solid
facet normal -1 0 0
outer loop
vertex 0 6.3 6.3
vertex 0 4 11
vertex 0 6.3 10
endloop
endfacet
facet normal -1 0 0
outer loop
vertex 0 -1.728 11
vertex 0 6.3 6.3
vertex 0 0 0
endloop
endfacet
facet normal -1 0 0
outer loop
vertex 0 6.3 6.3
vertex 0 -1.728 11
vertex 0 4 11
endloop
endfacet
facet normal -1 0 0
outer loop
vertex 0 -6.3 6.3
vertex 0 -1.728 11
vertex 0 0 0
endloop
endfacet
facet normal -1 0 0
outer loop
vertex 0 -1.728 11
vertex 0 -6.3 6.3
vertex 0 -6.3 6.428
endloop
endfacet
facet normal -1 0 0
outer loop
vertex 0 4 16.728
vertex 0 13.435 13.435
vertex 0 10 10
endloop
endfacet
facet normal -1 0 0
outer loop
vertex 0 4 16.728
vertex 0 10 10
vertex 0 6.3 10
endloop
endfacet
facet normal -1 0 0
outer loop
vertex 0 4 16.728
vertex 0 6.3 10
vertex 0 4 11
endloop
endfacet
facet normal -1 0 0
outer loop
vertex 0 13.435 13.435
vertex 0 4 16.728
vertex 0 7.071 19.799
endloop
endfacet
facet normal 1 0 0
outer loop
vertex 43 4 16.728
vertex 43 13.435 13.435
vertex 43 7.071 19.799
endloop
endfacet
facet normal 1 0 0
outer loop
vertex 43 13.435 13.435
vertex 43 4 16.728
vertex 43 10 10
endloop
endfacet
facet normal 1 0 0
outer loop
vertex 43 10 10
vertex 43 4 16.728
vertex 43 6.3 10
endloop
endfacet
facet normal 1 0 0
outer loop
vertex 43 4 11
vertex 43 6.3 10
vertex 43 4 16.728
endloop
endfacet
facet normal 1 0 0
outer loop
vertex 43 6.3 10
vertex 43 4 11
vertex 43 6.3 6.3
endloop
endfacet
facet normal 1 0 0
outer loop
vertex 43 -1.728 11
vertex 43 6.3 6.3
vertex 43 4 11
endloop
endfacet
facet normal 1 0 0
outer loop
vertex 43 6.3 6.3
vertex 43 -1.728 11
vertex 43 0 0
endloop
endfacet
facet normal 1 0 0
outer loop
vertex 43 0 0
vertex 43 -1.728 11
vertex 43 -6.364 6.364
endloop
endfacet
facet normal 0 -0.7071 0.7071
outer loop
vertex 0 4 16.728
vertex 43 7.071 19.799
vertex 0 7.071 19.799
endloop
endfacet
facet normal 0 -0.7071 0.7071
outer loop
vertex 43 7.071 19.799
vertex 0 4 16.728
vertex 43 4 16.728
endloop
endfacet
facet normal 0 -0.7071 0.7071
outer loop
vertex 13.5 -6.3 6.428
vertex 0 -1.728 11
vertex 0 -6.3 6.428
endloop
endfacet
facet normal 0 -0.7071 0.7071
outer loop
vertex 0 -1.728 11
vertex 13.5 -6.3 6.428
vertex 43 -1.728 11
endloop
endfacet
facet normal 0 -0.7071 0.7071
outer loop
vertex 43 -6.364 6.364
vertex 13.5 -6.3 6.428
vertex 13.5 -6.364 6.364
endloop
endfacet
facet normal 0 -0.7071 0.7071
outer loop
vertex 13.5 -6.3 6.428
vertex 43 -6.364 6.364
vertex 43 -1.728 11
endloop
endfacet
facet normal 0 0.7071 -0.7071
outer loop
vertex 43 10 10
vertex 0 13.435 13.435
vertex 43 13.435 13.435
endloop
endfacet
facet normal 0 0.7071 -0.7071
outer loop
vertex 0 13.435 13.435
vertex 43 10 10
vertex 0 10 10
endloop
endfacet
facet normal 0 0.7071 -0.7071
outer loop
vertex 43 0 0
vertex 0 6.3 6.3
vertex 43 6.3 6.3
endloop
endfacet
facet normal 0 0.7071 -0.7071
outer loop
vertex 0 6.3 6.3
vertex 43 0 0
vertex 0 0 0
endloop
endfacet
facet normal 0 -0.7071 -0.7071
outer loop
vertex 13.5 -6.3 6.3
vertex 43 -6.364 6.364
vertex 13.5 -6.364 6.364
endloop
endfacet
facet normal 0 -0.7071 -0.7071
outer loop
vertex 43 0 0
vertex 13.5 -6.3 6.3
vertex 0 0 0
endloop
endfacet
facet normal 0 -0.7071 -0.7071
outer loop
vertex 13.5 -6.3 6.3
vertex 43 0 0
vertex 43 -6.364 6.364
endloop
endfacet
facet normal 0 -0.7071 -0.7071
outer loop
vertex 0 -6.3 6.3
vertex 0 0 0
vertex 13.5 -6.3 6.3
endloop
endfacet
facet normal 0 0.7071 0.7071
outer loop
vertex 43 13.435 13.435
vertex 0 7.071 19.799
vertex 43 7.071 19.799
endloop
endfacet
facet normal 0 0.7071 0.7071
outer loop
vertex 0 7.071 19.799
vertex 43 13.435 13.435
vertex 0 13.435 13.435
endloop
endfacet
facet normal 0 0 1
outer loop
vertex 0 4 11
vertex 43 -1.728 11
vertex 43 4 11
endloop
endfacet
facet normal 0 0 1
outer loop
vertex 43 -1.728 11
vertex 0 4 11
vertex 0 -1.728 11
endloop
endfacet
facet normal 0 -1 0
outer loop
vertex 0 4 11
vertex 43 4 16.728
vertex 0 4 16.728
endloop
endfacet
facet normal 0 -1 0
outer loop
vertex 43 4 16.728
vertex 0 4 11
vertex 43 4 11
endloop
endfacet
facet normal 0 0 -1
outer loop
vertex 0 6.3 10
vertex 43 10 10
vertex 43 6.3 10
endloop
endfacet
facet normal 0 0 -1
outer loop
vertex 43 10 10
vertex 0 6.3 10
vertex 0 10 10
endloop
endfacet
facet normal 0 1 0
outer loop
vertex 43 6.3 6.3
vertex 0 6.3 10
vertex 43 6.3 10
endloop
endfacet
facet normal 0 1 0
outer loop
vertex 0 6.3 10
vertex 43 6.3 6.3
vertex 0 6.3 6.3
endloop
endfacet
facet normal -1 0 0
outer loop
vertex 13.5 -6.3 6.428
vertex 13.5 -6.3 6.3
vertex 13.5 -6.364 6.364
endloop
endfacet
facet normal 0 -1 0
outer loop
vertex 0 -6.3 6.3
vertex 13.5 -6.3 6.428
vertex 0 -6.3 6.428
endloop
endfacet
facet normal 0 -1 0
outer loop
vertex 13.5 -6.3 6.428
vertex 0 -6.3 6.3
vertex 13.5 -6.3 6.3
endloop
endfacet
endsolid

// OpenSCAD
use <MCAD/involute_gears.scad>

module cutout() {
	difference() {
		rotate([45,0,0]) cube([33,9,9]);
		translate([-0.5,-6,11]) cube([34,10,10]);
		translate([-0.5,6.3,0]) cube([34,10,10]);
		translate([-0.5,-16.3,0]) cube([34,10,10]);
	}
}

module cageUp(withServo) {
	difference() {
		union() {
			translate([-12.5,-8,0]) cube([25,16,17.2]);
			difference() {
				translate([-16.1,-8,10]) cube([32.2,16,7.2]);
				translate([11,-8.25,11]) rotate([0,45,0]) cube([30, 16.5, 30]);		
				translate([-11,-8.25,11]) rotate([0,-135,0]) cube([10, 16.5, 10]);
			}
		}
		translate([-11.75,-6.3,1]) cube([23.5,12.6,16.3]);
		translate([-13,-6.3,3]) cube([26,12.6,7]);
		translate([-16.5,0,3.65]) cutout();
		translate([-10,-8.1,1]) cube([20,16.2,10]);
		translate([-5,-8.1,1]) cube([10,16.2,14.7]);
		translate([-3.7,-10,4.65]) rotate([0, 0, 90]) cutout();
		translate([3.7,-10,4.65]) rotate([0, 0, 90]) cutout();
		translate([13.75,0,14.3]) cylinder(r=1,h=3,$fn=45);
		translate([-13.75,0,14.3]) cylinder(r=1,h=3,$fn=45);
	}
	if (withServo) {
		translate([11.5,6.3,1]) rotate([0,0,180]) servo();
	}
}

module cageSide(withServo, mount) {
	difference() {
		rotate([-90,0,0]) union() {
			translate([-13.5,-8,0]) cube([27,16,17.2]);
			translate([-16.1,-8,12.2]) cube([32.2,16,5]);
		}
		rotate([-90,0,0]) translate([-11.75,-6.3,1]) cube([23.5,12.6,16.3]);
		rotate([-90,0,0]) translate([11,-12,3.5]) cube([3,15,4]);
		rotate([-90,0,0]) translate([13.75,0,10.3]) cylinder(r=1,h=8,$fn=45);
		rotate([-90,0,0]) translate([-13.75,0,10.3]) cylinder(r=1,h=8,$fn=45);
		rotate([-90,0,0]) translate([-11.75,-10,1]) cube([23.5,12.6,16.3]);
	}
	if (mount) {
		translate([5.5, 0, 0]) rotate([90, 0, 0]) union() {
			cylinder(r=6.2, h=0.5, $fn=45);
			difference() {
				cylinder(r=5, h=3.5, $fn=45);
				translate([0,0,-0.05]) cylinder(r=1.1, h=4, $fn=45);
			}
		}
		color("Green") rotate([-90,0,0]) translate([5.3, 4.95, -3.5]) cube([0.4, 5, 2.5]);
	}
	if (withServo) {
		translate([11.8,1,-6.3]) rotate([90,0,180]) servo();
	}
}

module footBar(length,width,height) {
	translate([-length/2,-width/2,0]) cube([length,width,height]);
	translate([-length/2,0,0]) cylinder(r=width/2,h=height,$fn=45);
	translate([length/2,0,0]) cylinder(r=width/2,h=height,$fn=45);
}

module foot(withServo) {
	footBar(100,10,3);
	rotate([0,0,90]) footBar(100,10,3);
	translate([-5.5,0,2]) cageUp(withServo);
	translate([-18,-8,0]) cube([25,16,3]);
}

module swing(withServo) {
	translate([-5.5,-12.5,12.9]) cageSide(withServo, true);
	difference() {
		union() {
			cylinder(r=20,h=5,$fn=45);
			translate([-45, 17.5, 2.5]) rotate([0, 90, 0]) cylinder(r=2.5, h=45, $fn=45);
			translate([-27, 17.4, 2.5]) rotate([60, 90, 0]) cylinder(r=2.5, h=20, $fn=45);
		}
		translate([0,0,-0.05]) cylinder(r=3,h=5.1,$fn=45);
		translate([0, -18, 5.1]) cube([30, 10, 2], center=true);
		translate([0, 18, 5.1]) cube([30, 10, 2], center=true);
	}
}

module armPart(ri) {
	difference() {
		union() {
			cube([20, 2, 16]);
			translate([0,0,8]) rotate([-90,0,0]) cylinder(r=8, h=2, $fn=45);
		}
		translate([0, -0.1, 8]) rotate([-90,0,0]) cylinder(r=ri, h=2.2, $fn=45);
	}
}

module rampPart(length) {
	difference() {
		cube([length, 8, 8]);
		translate([0,3,0]) rotate([30, 0, 0]) translate([-0.1, -8, 0]) cube([length+0.2,8,8]);
		translate([-0.1,5,0]) rotate([-30, 0, 0]) cube([length+0.2,8,8]);
		translate([-0.1,4,10]) rotate([0,90,0]) cylinder(r=5, h=length+0.2, $fn=45);
	}
}

module springHolder() {
	rampPart(20);
	translate([1.7,0,0.1]) rotate([0,-15,0]) translate([-5,0,0]) rampPart(5);
	translate([-1.5,0,-0.7]) rotate([0,-30,0]) translate([-5,0,0]) rampPart(5);
	translate([18,4,0]) cylinder(r=1, h=8, $fn=45);
	translate([18,4,4.5]) rotate([0,30,0]) cylinder(r=1, h=4, $fn=45);
	translate([18.5,4,7.5]) cylinder(r=1.5, h=1, $fn=45);
	translate([19.5,4,7.5]) cylinder(r=1.5, h=1, $fn=45);
	translate([18.5,2.5,7.5]) cube([1,3,1]);
}

module arm(withServo, spring) {
	translate([44,-12.5,8]) difference() {
		cageSide(withServo, true);
		translate([0,0,-13]) cube([40,40,10], center=true);
	}
	translate([0,-15,0]) armPart(5.2);
	translate([0,15.5,0]) armPart(3.6);
	translate([20, -15, 0]) rotate([0, 0, 45]) cube([6, 2, 16]);
	translate([22.5, -12.5, 0]) cube([8, 2, 16]);
	translate([20, 17.5, 0]) rotate([0, 0, -45]) translate([0, -2, 0]) cube([6.35, 2, 16]);
	translate([22.5, -12.5, 0]) cube([2, 25.5, 16]);
	translate([23, -0.3, 0]) cube([5, 5, 16]);
	translate([9, 17.4, 0]) cube([6,4.5,5]);
	translate([9, 19.9, 4.9]) cube([6,2,6.2]);
	translate([9, 17.4, 11]) cube([6,4.5,5]);
	if (spring) {
		translate([0,12.5,15.9]) springHolder();
	}
}

module armFront(withServo) {
	translate([28,0.5,8]) rotate([0,0,-90]) difference() {
		cageSide(withServo, false);
		translate([-20,15.3,-10]) cube([43,2,20]);
	}
	translate([0,-15,0]) armPart(5.2);
	translate([0,15.5,0]) armPart(3.6);
	translate([20, -15, 0]) rotate([0, 0, 45]) cube([6, 2, 16]);
	translate([21.5, -13, 0]) cube([7, 2, 16]);
	translate([22.5, 12, 0]) cube([6, 2, 16]);
	translate([20, 17.5, 0]) rotate([0, 0, -45]) translate([0, -2, 0]) cube([6.35, 2, 16]);
	translate([22.5, -13, 0]) cube([2, 27, 16]);
	translate([9, 17.4, 0]) cube([6,4.5,5]);
	translate([9, 19.9, 4.9]) cube([6,2,6.2]);
	translate([9, 17.4, 11]) cube([6,4.5,5]);
}

module frontPlate() {
	rotate([0,-90,0]) difference() {
		cube([2,43,20]);
		translate([-4,31.25,10]) rotate([0,90,0]) cylinder(r=1,h=8,$fn=45);
		translate([-4,3.75,10]) rotate([0,90,0]) cylinder(r=1,h=8,$fn=45);
		translate([-1,5.75,3.75]) cube([4,23.5,12.6]);
	}
}

module gripperGear(outerRadius,innerRadius) {
	outerteeth=10;
	pitch = outerRadius/outerteeth*360;
	echo("pitch: ", pitch);
	innerteeth=12;
	innerpitch = innerRadius/innerteeth*360;
	rotate([0,0,-4]) difference() {
		gear (number_of_teeth=outerteeth,
			pressure_angle=18,
			circular_pitch=pitch,
   	   gear_thickness = 3,
      	rim_thickness = 3,
	      hub_thickness = 3,
			bore_diameter = 1.5);
		translate([0,0,1]) 
			gear (number_of_teeth=innerteeth,
				pressure_angle=45,
				circular_pitch=innerpitch,
   		   gear_thickness = 2.5,
      		rim_thickness = 2.5,
	      	hub_thickness = 2.5,
				bore_diameter = 0);
	}
}

module gripper() {
	difference() {
		cube([40,23.6,11.5]);
		translate([17.5,3.5,-0.5]) cube([24,16.6,13]);
		translate([19.5,1.5,-0.5]) cube([12,20.6,13]);
		translate([35.6,1.6,-0.5]) cube([2.4, 20.4, 20]);
		translate([0,-0.1,5]) rotate([0,-12,0]) cube([38,24,11.5]);
		translate([46,0,0]) rotate([0,0,45]) translate([-5,-5,-0.1]) cube([10,10,12]);
		translate([31.5,8.6,0]) rotate([0,0,45]) translate([-5,-5,-0.1]) cube([10,10,12]);
		translate([46,23.6,0]) rotate([0,0,45]) translate([-5,-5,-0.1]) cube([10,10,12]);
		translate([31.5,15,0]) rotate([0,0,45]) translate([-5,-5,-0.1]) cube([10,10,12]);
		translate([9,-1.8,0]) rotate([0,0,45]) translate([-7.5,-7.5,-0.1]) cube([15,15,12]);
		translate([9,25.3,0]) rotate([0,0,45]) translate([-7.5,-7.5,-0.1]) cube([15,15,12]);
		translate([-0.1,-0.1,-0.1]) cube([9.1, 9, 12]);
		translate([-0.1,14.7,-0.1]) cube([9.1, 9, 12]);
		translate([12.7,11.8,-0.1]) cylinder(r=3,h=12);
		translate([19.5,-0.1,3]) cube([3.7,2.5,1.4]);
		translate([23.5,-0.1,2]) cube([3.9,2.5,4.4]);
	}

*%	translate([0,0,11.5]) rotate([-90,0,0]) scale([10,10,10]) import("Gripper_v5.stl");
}

module rackTooth() {
	difference() {
		translate([-0.5,0,0]) linear_exturde_flat_option(height=3.5) {
		involute_gear_tooth(5,5,5,6,7.5,10);
		}
		translate([-3.2,-3.2,-0.1]) cube([5,5,4]);
	}
}

module gripperRack() {
	cube([3.5,30,3.5]);
	for (i=[0:7]) {
		translate([0, 4 + 2.96*i, 0]) rackTooth();
	}
	translate([-2.45,4,0]) cube([2.5,1,3.5]);
	translate([-4.4,2.5,0]) cube([2,4,3.5]);
}

module servo() {
	color("LightBlue", 0.5) {
		cube([23.5,12.6,16.4]);
		translate([-4.65,0,16.3]) difference() {
			cube([32.8,12.6,2]);
			translate([2.65,6.3,-0.1]) cylinder(r=1,h=3,$fn=45);
			translate([32.8-2.65,6.3,-0.1]) cylinder(r=1,h=3,$fn=45);
		}
		translate([0,0,18.2]) cube([23.5,12.6,4.4]);
		translate([6.3,6.3,22.5]) cylinder(r=6.3,h=4.1,$fn=45);
		translate([6.3,6.3,26.5]) cylinder(r=2.25,h=2.8,$fn=45);
	}
}

module overview() {
	foot(true);
	translate([0,0,38]) swing(true);
	translate([0,0,43]) arm(true, true);
	translate([49.5,0,43]) arm(true, false);
	translate([99,0,43]) {
		armFront(true);
		translate([45,18,-2]) rotate([180,90,0]) frontPlate();
		translate([81,-15.5,20]) rotate([90,180,0]) gripper();
// gripperRack and gripperGear are commented because
// they slow down rendering considerably on my PC
*		translate([58,-22.5,18]) rotate([0,90,0]) gripperRack();
		translate([81,3.5,-3]) rotate([-90,180,0]) gripper();
*		translate([58,12.5,-1]) rotate([0,-90,180]) gripperRack();
*		translate([61,-5,8.5]) rotate([0,-90,0]) gripperGear(4.5,2.5);
	}
}

// print one foot
*foot(false);
// print one swing
*swing(false);
// print one arm with spring holder
*arm(false, true);
// print one arm without spring holder
*arm(false, false);
// print one armFront
*arm(false, false);
// print one armFront
*armFront(false);
// print one frontPlate
*frontPlate();
// print one gripperGear
*gripperGear(4.5,2.5);
// print two gripper
*gripper();
// print two gripperRack
*gripperRack();

// shows the complete thing
*overview();
module cutout2() {
	difference() {
		rotate([45,0,0]) cube([43,19,9]);
		translate([-0.5,-6,11]) cube([44,10,10]);
		translate([-0.5,6.3,0]) cube([44,10,10]);
		translate([-0.5,-16.3,0]) cube([14,10,10]);
	}
}

cutout2();
